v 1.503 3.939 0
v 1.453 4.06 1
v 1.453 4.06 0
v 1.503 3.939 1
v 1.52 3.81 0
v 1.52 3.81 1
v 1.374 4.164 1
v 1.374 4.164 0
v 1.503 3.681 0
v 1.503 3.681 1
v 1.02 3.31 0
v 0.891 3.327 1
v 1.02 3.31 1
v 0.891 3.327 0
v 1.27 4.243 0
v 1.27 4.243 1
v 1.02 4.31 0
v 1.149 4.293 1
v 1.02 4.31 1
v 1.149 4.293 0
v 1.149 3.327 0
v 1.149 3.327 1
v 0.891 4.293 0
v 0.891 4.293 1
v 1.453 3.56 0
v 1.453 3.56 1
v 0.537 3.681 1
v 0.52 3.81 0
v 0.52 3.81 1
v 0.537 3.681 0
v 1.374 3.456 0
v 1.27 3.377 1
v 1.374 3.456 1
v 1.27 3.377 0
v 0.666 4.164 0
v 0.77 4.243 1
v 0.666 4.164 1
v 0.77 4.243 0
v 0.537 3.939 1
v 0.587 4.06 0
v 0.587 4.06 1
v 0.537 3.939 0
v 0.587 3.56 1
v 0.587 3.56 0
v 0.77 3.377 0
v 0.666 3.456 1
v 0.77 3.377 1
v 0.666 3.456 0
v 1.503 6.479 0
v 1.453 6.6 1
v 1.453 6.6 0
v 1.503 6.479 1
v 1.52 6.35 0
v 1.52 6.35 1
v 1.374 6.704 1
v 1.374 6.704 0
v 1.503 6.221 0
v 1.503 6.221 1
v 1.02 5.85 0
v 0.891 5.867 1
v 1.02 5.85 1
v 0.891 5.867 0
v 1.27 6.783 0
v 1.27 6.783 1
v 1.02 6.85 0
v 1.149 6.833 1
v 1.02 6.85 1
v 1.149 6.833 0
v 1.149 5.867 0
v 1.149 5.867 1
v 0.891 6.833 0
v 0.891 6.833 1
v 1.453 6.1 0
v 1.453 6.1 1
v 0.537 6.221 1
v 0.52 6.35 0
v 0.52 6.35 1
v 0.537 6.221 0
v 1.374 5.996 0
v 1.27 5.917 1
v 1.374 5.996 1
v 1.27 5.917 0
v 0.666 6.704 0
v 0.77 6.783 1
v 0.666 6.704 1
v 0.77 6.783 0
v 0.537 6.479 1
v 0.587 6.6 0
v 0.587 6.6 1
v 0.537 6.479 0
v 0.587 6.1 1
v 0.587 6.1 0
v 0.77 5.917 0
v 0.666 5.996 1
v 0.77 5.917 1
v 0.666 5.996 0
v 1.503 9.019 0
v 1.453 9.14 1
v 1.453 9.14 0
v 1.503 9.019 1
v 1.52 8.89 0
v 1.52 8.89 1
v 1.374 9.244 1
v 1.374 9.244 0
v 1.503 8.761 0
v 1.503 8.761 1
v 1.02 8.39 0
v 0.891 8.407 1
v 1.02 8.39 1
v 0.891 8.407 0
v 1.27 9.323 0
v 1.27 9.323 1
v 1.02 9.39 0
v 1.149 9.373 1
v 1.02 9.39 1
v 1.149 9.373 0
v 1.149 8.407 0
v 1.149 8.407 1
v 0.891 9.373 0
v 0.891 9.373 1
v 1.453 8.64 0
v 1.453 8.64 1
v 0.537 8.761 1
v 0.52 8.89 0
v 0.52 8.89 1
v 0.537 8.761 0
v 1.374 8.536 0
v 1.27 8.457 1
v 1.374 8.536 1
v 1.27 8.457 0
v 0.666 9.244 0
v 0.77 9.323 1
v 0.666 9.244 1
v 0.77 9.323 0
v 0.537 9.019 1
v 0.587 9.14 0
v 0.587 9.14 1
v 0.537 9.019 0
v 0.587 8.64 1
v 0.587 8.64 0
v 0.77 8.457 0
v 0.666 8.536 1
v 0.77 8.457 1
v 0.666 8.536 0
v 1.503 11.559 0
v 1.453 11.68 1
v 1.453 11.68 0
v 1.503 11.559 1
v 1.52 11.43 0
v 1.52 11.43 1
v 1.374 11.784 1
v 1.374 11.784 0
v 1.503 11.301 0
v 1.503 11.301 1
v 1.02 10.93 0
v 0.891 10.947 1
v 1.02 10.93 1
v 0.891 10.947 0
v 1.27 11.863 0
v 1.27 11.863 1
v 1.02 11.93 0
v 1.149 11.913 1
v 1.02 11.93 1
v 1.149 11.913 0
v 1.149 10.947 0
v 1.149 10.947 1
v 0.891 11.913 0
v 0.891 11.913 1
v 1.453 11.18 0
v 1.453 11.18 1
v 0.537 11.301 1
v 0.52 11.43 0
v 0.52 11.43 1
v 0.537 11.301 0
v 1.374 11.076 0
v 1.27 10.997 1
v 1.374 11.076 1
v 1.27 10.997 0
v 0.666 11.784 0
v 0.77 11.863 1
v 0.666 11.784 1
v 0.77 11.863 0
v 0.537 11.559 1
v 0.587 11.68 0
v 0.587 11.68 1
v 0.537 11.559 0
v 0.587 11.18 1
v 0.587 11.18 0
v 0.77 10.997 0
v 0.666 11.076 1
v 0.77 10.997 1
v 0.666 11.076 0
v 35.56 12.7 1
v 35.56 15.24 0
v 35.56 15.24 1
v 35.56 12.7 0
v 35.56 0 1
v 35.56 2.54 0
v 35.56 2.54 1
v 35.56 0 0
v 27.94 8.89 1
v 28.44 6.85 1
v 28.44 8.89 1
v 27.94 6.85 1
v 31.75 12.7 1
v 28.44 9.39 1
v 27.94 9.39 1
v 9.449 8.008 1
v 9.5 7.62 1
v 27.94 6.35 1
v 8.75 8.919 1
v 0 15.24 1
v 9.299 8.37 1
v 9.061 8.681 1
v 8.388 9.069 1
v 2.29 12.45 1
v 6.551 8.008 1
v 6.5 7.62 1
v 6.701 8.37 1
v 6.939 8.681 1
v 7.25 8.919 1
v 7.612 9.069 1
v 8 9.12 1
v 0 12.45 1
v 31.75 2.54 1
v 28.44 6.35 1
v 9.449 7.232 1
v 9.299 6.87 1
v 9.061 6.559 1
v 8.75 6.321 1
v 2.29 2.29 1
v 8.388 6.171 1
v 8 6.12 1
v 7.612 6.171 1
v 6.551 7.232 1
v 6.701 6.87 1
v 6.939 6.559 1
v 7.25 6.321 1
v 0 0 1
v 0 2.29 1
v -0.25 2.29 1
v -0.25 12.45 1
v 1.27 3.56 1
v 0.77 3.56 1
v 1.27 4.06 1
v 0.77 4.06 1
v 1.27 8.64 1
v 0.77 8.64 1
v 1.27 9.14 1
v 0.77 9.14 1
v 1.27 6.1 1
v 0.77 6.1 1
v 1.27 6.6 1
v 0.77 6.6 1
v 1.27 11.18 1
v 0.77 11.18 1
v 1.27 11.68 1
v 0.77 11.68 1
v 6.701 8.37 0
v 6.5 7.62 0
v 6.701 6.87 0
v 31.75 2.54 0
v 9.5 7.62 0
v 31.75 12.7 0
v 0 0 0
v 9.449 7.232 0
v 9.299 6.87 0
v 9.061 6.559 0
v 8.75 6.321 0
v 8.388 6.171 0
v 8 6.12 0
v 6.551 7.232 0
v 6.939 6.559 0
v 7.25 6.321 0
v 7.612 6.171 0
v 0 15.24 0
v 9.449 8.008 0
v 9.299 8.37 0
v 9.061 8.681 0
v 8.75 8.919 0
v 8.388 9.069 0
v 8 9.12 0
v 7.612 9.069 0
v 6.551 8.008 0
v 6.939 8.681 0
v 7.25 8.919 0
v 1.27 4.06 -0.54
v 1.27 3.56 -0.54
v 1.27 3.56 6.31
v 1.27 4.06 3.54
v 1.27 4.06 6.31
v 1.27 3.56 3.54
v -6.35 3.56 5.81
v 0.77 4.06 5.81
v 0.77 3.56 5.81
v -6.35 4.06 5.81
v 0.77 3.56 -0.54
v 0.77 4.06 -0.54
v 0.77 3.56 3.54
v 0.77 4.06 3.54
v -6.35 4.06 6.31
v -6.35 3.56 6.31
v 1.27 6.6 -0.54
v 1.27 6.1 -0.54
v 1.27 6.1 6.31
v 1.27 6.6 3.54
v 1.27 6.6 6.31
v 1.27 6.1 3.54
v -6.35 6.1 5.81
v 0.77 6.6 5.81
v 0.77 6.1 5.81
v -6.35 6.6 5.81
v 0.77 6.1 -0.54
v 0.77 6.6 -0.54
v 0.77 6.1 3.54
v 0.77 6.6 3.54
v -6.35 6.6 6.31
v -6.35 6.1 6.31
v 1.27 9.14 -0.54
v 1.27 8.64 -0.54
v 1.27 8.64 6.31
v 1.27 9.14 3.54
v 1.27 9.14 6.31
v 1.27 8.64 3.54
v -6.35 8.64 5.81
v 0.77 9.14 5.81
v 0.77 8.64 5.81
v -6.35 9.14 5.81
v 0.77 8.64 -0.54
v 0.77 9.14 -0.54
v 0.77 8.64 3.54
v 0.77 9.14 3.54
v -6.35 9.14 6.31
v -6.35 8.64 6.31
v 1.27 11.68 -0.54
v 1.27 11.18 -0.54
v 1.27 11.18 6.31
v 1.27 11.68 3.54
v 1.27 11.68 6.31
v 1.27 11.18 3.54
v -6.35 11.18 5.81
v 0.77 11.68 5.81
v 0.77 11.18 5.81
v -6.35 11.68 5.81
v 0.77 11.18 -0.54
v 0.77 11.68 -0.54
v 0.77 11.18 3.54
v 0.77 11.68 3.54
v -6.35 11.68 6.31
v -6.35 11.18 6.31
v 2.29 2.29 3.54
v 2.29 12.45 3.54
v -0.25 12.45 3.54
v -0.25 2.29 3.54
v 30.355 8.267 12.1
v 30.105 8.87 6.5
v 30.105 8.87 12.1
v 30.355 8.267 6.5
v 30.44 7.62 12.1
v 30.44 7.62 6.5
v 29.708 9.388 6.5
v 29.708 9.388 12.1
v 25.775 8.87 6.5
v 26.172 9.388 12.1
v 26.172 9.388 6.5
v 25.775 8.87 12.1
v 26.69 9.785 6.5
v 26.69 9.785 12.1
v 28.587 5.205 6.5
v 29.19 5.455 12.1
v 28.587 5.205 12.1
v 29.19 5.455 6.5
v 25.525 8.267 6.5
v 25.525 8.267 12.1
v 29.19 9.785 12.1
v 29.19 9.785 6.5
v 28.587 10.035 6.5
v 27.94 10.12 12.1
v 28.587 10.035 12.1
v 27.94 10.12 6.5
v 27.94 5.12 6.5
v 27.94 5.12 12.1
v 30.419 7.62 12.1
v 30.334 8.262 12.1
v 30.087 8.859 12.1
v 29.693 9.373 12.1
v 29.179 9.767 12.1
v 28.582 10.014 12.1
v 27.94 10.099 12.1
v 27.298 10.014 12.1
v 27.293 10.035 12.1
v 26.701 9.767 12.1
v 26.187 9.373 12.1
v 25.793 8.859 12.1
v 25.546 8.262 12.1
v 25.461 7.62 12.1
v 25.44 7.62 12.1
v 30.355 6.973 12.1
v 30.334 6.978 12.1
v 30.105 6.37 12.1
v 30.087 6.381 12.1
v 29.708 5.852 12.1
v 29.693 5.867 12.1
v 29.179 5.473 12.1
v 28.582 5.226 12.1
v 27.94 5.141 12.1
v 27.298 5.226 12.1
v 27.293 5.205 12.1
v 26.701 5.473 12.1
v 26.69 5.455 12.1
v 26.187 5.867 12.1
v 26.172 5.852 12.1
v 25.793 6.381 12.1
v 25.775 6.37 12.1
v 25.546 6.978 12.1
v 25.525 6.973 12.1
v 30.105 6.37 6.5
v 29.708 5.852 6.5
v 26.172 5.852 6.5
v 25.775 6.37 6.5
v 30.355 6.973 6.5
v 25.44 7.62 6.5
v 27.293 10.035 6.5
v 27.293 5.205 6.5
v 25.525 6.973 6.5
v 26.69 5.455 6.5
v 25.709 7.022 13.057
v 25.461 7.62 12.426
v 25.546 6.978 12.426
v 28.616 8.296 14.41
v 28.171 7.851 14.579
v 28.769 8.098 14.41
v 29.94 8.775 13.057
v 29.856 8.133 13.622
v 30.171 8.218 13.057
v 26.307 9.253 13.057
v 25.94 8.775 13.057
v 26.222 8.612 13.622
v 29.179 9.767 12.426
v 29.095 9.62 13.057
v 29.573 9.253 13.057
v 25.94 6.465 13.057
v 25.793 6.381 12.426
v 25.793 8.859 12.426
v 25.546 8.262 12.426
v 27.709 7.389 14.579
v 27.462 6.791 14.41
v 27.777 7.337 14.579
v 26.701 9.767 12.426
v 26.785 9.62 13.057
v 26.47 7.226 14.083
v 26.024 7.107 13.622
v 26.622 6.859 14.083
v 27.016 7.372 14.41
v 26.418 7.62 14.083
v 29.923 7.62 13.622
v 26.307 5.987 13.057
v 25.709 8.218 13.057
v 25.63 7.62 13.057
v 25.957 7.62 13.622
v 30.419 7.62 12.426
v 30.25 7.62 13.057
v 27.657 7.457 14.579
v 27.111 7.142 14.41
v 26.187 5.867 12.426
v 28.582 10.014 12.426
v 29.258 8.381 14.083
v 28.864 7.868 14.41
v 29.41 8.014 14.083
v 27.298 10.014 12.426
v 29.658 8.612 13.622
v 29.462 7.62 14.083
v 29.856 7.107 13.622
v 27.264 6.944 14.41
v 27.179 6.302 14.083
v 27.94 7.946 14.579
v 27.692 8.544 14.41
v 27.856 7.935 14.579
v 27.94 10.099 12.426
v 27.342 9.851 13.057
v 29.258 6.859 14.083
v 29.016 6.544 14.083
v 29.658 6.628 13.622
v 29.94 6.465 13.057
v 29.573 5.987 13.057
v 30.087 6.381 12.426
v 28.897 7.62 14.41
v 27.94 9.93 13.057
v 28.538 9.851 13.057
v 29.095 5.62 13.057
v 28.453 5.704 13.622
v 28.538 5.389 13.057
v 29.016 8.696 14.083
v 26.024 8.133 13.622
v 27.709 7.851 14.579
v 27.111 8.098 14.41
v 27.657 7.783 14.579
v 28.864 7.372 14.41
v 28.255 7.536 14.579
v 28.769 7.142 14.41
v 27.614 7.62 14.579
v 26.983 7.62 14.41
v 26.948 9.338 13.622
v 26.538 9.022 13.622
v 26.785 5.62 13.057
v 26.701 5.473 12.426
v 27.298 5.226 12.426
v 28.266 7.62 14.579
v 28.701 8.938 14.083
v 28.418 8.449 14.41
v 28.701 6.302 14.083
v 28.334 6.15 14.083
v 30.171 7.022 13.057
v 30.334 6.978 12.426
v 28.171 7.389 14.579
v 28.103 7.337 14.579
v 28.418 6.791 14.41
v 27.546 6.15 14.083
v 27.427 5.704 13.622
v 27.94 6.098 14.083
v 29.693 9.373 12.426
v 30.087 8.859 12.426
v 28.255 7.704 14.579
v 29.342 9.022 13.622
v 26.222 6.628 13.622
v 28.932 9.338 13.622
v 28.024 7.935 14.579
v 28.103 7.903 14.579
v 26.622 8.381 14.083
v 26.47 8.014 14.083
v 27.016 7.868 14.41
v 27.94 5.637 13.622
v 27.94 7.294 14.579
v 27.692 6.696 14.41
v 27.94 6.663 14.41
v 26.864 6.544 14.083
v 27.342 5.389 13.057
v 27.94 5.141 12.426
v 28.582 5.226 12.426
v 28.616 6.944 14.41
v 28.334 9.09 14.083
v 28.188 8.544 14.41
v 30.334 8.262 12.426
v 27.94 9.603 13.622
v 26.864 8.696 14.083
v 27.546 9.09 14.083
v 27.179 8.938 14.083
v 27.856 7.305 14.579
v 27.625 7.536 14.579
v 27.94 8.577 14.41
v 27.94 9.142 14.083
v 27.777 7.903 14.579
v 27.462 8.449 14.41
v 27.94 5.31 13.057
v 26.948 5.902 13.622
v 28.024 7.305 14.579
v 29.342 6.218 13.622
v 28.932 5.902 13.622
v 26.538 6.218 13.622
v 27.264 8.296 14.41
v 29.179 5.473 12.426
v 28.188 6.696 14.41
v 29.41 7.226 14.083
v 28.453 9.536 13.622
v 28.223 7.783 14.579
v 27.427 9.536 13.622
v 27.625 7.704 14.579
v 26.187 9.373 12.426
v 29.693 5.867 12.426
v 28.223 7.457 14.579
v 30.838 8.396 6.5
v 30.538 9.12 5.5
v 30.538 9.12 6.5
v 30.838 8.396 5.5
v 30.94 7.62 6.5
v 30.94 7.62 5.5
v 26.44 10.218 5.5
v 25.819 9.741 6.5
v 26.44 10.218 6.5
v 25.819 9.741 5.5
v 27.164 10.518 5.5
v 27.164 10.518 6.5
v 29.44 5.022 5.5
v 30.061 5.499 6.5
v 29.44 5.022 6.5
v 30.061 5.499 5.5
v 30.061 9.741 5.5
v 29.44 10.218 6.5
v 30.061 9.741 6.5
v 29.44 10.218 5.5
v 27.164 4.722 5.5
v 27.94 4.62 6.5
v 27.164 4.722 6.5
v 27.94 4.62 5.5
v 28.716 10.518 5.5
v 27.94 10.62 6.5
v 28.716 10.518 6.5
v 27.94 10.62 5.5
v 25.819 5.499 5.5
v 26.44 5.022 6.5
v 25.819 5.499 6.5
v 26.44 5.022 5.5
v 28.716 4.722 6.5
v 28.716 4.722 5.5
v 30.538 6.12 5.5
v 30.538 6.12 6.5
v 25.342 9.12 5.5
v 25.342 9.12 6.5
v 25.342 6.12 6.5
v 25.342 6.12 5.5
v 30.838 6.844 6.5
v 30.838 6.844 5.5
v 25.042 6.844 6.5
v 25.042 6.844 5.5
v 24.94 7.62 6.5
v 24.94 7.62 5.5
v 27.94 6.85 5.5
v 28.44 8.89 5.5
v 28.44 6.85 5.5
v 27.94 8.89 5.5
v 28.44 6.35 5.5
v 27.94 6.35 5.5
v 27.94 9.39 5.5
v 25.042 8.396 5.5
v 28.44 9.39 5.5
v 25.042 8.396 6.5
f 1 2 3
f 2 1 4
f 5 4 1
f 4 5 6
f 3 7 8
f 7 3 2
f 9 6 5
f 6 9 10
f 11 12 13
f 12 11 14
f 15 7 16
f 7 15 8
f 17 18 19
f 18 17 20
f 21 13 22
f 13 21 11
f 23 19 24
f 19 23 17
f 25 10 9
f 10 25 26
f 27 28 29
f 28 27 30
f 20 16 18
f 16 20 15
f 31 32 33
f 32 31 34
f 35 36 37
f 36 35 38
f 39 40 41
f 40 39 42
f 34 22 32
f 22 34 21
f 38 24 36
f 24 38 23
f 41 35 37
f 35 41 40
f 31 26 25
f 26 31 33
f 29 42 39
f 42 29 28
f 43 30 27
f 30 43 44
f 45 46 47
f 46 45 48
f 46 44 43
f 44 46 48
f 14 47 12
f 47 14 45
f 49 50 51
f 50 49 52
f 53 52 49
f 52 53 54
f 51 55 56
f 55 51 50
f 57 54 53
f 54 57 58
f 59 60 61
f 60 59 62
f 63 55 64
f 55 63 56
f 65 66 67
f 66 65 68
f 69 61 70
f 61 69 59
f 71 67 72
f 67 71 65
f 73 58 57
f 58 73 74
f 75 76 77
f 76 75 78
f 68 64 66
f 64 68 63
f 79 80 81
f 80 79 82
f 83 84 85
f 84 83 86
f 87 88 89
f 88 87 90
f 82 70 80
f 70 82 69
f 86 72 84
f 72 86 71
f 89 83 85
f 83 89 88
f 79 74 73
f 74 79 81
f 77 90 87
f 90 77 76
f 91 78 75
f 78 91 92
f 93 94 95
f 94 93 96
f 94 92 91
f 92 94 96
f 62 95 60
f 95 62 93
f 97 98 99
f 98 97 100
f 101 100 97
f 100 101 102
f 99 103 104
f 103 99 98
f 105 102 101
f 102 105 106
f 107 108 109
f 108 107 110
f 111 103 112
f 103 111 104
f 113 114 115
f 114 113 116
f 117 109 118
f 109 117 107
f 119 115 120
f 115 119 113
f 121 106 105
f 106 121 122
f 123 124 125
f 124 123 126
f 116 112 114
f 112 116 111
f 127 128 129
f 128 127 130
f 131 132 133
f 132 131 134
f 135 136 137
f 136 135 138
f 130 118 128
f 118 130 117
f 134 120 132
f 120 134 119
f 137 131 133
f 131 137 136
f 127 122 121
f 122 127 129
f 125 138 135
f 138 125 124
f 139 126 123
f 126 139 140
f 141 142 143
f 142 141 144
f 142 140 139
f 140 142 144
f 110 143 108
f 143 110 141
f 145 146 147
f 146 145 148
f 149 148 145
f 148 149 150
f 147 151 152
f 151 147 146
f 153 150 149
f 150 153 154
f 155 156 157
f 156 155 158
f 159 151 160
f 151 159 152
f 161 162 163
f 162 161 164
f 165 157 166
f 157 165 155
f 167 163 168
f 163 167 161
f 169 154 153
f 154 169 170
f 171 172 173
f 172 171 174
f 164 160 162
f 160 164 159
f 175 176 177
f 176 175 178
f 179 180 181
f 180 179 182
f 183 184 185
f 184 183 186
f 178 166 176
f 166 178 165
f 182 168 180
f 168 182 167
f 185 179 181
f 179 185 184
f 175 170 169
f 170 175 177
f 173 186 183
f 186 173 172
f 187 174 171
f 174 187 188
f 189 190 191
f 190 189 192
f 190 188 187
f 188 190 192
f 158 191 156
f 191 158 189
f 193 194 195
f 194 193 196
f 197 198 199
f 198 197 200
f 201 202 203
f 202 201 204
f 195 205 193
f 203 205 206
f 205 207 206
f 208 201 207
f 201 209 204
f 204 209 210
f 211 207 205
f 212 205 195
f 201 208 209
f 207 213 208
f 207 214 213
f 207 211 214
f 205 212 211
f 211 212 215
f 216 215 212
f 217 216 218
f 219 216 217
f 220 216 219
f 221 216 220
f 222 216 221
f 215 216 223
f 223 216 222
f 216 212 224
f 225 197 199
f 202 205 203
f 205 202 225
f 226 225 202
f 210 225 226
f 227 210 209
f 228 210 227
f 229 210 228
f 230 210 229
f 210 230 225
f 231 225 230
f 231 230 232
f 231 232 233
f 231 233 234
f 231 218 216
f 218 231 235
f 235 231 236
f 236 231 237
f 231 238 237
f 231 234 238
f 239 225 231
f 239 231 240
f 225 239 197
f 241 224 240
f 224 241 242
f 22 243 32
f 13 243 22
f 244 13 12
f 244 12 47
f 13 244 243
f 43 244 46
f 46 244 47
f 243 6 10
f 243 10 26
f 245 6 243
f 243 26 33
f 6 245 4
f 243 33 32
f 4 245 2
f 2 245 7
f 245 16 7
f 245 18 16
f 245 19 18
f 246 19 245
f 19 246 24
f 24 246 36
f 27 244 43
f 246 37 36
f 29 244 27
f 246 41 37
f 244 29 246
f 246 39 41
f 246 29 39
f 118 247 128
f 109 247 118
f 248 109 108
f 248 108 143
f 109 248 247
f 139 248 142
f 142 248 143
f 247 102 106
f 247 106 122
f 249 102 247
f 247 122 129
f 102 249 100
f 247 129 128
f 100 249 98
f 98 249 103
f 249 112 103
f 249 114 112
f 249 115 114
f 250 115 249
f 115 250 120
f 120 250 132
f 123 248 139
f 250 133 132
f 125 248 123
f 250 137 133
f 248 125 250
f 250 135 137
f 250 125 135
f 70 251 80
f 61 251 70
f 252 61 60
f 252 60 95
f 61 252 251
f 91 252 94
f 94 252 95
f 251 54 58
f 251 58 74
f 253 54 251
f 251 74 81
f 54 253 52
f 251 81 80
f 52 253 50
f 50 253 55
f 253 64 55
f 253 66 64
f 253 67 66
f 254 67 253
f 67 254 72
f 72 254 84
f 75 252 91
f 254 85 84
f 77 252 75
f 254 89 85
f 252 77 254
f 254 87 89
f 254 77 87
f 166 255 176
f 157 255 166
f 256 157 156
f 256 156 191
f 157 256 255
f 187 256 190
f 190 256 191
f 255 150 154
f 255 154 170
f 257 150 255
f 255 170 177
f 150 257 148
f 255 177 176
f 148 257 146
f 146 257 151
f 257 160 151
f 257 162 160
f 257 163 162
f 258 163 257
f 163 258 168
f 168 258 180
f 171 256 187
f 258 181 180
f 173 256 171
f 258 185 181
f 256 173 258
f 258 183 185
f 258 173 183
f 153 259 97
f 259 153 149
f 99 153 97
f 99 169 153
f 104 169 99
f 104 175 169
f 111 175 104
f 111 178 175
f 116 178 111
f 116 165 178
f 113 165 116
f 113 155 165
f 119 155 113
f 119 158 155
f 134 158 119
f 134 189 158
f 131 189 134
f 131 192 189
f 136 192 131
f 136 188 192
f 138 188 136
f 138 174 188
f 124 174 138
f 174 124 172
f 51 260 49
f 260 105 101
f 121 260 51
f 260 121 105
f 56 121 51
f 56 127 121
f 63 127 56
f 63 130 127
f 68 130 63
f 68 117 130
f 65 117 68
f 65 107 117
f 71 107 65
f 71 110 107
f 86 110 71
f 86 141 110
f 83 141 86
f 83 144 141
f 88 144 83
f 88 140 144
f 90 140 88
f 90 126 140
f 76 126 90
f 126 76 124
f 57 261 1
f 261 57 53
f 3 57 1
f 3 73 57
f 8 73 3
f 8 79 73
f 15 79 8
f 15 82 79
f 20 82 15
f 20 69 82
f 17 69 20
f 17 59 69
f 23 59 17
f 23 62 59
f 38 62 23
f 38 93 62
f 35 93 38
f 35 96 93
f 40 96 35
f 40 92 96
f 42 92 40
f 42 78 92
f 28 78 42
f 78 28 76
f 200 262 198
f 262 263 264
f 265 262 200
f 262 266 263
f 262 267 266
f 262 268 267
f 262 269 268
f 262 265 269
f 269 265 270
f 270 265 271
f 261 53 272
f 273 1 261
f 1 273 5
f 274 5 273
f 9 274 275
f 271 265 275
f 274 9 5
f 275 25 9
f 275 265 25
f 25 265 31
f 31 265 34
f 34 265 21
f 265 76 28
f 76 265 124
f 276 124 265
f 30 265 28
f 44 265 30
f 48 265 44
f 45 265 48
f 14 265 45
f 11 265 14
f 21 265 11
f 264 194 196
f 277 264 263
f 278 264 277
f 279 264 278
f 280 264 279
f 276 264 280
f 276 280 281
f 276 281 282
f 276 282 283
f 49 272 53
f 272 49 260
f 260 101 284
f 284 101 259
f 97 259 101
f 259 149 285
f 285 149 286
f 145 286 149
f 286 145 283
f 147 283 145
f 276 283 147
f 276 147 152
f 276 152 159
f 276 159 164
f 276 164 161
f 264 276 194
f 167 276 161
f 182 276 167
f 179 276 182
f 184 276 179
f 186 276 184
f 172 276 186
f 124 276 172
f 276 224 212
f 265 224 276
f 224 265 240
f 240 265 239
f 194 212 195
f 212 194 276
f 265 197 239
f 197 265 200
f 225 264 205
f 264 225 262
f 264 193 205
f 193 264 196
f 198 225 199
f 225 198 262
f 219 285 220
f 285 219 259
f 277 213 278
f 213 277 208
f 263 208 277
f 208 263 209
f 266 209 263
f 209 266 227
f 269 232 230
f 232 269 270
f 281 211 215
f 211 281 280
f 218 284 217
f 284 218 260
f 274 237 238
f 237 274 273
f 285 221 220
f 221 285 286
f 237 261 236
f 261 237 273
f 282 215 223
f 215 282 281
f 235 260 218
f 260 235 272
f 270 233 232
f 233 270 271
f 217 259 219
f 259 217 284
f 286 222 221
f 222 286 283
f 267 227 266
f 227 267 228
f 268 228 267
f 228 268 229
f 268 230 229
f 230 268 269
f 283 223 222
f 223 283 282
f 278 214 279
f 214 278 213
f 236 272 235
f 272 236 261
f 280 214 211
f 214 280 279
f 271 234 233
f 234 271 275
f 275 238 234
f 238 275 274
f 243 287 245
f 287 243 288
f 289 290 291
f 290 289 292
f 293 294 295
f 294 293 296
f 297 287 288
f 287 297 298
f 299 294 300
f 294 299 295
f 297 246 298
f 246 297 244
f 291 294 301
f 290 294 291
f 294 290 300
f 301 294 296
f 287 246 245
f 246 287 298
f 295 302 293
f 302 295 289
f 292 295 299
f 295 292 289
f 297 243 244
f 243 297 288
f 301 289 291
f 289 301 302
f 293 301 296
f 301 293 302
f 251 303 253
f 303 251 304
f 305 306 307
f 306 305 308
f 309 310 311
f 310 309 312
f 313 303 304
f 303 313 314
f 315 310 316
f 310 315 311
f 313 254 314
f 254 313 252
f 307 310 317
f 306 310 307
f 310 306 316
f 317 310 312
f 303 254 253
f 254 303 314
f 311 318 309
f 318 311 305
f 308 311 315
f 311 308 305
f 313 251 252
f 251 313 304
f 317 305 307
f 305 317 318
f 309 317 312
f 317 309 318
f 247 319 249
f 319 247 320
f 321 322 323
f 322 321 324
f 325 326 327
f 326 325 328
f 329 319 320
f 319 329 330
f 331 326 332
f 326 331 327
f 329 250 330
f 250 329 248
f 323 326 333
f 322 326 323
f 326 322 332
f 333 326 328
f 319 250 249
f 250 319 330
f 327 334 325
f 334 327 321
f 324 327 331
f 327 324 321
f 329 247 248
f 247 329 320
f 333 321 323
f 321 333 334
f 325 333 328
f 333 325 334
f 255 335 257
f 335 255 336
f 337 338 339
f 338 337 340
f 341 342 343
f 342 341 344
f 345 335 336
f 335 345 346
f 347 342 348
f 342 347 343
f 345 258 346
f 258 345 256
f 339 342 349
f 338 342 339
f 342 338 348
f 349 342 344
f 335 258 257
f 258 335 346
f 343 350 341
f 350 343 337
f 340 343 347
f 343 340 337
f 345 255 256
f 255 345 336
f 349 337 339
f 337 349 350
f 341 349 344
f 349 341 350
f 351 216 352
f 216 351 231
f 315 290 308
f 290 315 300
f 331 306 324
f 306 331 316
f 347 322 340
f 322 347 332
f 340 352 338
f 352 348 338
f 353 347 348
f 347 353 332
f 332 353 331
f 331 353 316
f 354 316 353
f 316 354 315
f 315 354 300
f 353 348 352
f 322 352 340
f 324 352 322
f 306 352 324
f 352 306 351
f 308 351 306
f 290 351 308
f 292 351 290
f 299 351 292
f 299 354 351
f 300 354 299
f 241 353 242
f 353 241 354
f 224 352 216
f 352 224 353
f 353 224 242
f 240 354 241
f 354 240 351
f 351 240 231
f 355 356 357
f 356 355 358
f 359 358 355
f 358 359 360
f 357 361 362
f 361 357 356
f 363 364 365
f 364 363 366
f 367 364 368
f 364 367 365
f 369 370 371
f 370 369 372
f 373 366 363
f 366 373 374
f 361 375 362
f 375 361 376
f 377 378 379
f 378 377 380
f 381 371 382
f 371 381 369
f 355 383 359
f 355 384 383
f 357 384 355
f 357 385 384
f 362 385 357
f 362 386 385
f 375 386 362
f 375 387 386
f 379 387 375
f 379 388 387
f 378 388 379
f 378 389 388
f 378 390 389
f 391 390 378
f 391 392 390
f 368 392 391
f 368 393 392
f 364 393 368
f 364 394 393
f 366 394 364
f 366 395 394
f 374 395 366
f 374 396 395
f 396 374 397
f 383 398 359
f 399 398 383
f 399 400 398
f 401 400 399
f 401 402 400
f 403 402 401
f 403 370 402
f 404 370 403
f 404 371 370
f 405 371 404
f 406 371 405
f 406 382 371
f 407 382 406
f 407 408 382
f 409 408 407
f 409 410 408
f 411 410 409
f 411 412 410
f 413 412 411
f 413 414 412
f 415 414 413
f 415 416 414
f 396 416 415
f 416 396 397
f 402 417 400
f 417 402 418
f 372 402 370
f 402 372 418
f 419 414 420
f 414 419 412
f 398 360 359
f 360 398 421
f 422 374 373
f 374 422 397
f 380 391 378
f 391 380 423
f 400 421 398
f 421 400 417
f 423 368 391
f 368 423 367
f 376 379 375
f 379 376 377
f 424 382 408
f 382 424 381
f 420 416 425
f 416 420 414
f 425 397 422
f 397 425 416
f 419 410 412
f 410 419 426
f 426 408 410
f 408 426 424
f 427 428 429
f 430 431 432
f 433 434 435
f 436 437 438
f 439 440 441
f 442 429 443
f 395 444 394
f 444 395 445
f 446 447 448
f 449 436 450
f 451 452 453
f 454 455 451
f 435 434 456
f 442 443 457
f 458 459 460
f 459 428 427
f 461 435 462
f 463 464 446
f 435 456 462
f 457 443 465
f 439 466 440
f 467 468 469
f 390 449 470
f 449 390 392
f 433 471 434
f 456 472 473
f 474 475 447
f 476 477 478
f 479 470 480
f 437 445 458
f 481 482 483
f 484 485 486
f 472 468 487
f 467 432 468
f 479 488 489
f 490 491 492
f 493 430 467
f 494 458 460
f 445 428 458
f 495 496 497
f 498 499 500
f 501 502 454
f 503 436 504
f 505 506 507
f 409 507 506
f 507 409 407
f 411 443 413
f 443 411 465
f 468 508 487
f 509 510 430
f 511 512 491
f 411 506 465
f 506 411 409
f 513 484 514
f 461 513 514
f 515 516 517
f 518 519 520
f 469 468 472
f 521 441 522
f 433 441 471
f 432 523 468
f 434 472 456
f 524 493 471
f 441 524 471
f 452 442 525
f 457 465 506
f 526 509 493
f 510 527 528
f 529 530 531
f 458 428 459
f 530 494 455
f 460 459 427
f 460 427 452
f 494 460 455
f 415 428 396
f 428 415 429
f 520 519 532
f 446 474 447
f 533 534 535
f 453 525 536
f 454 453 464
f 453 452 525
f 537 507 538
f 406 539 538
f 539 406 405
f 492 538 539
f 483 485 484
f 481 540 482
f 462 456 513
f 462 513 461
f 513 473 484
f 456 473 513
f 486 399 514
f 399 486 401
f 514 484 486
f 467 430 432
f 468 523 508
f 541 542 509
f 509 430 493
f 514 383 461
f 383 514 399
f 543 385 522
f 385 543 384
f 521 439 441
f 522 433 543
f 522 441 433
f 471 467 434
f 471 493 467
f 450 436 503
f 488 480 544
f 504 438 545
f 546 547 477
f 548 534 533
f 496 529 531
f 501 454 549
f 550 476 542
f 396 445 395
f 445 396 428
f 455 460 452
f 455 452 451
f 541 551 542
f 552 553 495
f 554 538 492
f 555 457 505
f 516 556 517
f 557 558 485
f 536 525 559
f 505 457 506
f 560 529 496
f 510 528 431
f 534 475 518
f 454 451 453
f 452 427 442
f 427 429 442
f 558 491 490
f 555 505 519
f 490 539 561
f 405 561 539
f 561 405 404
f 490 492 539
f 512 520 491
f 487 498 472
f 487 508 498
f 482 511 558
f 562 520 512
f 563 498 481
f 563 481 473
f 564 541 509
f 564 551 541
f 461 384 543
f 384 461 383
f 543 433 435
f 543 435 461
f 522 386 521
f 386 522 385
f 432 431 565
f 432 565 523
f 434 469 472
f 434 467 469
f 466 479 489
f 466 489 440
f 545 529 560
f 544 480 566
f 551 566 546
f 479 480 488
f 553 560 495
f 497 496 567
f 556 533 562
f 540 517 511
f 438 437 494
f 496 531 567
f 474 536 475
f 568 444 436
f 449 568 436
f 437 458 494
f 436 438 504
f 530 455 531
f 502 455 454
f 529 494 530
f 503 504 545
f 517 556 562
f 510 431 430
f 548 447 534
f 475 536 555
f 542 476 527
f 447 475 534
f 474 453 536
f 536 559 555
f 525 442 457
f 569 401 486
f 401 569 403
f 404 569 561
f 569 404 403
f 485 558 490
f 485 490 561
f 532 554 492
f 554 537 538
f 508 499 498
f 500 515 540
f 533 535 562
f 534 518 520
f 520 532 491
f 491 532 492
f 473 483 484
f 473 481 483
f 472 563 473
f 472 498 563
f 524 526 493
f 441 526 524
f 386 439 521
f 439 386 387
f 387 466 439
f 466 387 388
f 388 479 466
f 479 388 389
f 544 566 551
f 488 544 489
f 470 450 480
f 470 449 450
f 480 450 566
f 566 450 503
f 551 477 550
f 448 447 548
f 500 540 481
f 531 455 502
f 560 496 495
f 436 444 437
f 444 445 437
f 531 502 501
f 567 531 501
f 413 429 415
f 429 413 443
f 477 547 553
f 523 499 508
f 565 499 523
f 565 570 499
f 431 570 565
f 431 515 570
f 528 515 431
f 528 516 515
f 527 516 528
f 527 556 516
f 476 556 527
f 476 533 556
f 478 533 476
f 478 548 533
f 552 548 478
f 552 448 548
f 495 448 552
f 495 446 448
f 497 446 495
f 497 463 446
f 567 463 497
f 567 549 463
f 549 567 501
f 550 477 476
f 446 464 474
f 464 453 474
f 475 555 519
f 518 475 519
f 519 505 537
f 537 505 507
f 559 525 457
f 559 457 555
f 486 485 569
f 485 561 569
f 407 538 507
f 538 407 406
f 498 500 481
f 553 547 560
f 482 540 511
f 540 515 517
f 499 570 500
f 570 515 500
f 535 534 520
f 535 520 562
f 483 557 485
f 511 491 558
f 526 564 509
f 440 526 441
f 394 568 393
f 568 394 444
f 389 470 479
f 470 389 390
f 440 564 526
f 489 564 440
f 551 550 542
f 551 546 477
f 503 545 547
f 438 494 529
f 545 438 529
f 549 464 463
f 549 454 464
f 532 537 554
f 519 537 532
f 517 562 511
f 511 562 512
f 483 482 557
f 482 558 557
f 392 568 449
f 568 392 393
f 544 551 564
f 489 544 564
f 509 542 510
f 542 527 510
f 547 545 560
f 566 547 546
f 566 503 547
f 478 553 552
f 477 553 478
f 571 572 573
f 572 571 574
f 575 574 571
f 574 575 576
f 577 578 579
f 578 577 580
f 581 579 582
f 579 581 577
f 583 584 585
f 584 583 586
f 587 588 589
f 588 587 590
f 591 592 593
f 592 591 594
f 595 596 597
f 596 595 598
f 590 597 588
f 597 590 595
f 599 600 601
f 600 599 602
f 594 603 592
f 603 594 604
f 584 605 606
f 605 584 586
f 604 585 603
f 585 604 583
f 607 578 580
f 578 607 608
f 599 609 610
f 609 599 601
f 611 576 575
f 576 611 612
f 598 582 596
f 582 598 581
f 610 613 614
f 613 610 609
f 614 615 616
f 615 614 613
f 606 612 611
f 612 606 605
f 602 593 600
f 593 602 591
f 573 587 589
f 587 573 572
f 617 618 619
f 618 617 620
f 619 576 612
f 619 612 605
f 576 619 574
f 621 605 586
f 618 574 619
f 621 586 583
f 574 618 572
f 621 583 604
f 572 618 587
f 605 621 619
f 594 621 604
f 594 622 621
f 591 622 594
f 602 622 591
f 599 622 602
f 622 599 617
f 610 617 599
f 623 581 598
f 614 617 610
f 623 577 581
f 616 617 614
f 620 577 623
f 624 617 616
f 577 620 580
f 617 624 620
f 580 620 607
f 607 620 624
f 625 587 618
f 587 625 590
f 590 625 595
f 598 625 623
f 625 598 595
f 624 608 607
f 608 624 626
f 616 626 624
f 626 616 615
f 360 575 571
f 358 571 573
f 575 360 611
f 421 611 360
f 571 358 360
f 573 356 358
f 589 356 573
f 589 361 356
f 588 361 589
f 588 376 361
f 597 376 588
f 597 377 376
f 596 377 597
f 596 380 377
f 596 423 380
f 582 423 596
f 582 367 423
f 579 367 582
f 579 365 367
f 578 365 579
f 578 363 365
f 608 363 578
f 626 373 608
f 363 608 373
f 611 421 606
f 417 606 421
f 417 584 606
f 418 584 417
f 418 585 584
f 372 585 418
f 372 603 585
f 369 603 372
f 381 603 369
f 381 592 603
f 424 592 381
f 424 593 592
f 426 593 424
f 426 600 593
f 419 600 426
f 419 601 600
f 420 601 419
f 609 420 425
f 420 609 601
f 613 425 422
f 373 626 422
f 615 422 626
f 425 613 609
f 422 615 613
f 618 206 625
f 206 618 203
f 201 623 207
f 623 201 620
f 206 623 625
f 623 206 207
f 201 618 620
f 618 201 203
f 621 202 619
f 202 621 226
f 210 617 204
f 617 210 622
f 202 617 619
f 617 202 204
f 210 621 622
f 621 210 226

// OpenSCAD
// file: Connectors.scad
// some connectors

module female_connectors_90(d=2.54,w=0.5,n=4){
    x=3*d;
    y=2.5*d;
    union() {
        color("DarkGray") 
        translate([-d,0,d/2])
        cube([d, n*d, d], center=true);
        color("White") 
        for (xl = [0: d : (n-1)*d]) {
            translate([-d-w/2, xl-(n-1)*d/2, 1-d]) {
            cube([w, w, y]);
            translate([-x+w,0,y]) cube([x, w, w]);}
        }
    }
}
// main file
// the KY-026 Flame sensor module
pcb_KY026 = [1.4*25.4, 0.6*25.4, 1];

use <Connectors.scad>

module ir_led(h=8.6, d=5.0)
{
    color("Blue")
    union() {
    cylinder(h=1.0, d=d+1, center=true, $fn=24);
    translate([0, 0, (h-d/2)/2]) {
    cylinder(h=h-d/2, d=d, center=true, $fn=24);
    translate([0, 0, (h-d/2)/2]) sphere(d=d, $fn=24);
    } }
    color("white")
    union() {
    pin_l = 5;  // pin length
    translate([0,2.54/2,-pin_l])
    cube([1/2,1/2,pin_l]);
    translate([0,-2.54/2,-pin_l])
    cube([1/2,1/2,pin_l]);}
}

module flame_sensor_connectors(def=pcb_KY026,d=2.54,w=0.5) {
    // the connector
    left=[d+d/2,def[1]/2,0];
    translate(left+[-w/2,-w/2,-w+1.5])
    female_connectors_90();
}

module flame_sensor_holes(def=pcb_KY026,d=2.54,w=0.5,n=4) {
    left=[d+d/2,def[1]/2,0];
    translate(left)
    for (xl = [0: d : (n-1)*d]) {
        translate([-d-w/2, xl-(n-1)*d/2, -d])
        cylinder(h=2*d, r=w, $fn=24);
    }
}

module flame_sensor(def=pcb_KY026) {
    color("Red")
    difference() {
    cube(def);
    translate(pcb_KY026-[0.15*25.4,(0.4+0.1)*25.4,1.5])
    cube([0.2*25.4, 0.4*25.4, 2]);
    translate([8, def[1]/2, -1.5]) 
        cylinder(d=3,h=3, $fn=24);

    // the connector holes
    flame_sensor_holes(def=def);
    }
    // the connector
    flame_sensor_connectors(def=def);
    // the IR led
    translate([1.1*25.4,def[1]/2,1+5])
    ir_led();
}

flame_sensor();
